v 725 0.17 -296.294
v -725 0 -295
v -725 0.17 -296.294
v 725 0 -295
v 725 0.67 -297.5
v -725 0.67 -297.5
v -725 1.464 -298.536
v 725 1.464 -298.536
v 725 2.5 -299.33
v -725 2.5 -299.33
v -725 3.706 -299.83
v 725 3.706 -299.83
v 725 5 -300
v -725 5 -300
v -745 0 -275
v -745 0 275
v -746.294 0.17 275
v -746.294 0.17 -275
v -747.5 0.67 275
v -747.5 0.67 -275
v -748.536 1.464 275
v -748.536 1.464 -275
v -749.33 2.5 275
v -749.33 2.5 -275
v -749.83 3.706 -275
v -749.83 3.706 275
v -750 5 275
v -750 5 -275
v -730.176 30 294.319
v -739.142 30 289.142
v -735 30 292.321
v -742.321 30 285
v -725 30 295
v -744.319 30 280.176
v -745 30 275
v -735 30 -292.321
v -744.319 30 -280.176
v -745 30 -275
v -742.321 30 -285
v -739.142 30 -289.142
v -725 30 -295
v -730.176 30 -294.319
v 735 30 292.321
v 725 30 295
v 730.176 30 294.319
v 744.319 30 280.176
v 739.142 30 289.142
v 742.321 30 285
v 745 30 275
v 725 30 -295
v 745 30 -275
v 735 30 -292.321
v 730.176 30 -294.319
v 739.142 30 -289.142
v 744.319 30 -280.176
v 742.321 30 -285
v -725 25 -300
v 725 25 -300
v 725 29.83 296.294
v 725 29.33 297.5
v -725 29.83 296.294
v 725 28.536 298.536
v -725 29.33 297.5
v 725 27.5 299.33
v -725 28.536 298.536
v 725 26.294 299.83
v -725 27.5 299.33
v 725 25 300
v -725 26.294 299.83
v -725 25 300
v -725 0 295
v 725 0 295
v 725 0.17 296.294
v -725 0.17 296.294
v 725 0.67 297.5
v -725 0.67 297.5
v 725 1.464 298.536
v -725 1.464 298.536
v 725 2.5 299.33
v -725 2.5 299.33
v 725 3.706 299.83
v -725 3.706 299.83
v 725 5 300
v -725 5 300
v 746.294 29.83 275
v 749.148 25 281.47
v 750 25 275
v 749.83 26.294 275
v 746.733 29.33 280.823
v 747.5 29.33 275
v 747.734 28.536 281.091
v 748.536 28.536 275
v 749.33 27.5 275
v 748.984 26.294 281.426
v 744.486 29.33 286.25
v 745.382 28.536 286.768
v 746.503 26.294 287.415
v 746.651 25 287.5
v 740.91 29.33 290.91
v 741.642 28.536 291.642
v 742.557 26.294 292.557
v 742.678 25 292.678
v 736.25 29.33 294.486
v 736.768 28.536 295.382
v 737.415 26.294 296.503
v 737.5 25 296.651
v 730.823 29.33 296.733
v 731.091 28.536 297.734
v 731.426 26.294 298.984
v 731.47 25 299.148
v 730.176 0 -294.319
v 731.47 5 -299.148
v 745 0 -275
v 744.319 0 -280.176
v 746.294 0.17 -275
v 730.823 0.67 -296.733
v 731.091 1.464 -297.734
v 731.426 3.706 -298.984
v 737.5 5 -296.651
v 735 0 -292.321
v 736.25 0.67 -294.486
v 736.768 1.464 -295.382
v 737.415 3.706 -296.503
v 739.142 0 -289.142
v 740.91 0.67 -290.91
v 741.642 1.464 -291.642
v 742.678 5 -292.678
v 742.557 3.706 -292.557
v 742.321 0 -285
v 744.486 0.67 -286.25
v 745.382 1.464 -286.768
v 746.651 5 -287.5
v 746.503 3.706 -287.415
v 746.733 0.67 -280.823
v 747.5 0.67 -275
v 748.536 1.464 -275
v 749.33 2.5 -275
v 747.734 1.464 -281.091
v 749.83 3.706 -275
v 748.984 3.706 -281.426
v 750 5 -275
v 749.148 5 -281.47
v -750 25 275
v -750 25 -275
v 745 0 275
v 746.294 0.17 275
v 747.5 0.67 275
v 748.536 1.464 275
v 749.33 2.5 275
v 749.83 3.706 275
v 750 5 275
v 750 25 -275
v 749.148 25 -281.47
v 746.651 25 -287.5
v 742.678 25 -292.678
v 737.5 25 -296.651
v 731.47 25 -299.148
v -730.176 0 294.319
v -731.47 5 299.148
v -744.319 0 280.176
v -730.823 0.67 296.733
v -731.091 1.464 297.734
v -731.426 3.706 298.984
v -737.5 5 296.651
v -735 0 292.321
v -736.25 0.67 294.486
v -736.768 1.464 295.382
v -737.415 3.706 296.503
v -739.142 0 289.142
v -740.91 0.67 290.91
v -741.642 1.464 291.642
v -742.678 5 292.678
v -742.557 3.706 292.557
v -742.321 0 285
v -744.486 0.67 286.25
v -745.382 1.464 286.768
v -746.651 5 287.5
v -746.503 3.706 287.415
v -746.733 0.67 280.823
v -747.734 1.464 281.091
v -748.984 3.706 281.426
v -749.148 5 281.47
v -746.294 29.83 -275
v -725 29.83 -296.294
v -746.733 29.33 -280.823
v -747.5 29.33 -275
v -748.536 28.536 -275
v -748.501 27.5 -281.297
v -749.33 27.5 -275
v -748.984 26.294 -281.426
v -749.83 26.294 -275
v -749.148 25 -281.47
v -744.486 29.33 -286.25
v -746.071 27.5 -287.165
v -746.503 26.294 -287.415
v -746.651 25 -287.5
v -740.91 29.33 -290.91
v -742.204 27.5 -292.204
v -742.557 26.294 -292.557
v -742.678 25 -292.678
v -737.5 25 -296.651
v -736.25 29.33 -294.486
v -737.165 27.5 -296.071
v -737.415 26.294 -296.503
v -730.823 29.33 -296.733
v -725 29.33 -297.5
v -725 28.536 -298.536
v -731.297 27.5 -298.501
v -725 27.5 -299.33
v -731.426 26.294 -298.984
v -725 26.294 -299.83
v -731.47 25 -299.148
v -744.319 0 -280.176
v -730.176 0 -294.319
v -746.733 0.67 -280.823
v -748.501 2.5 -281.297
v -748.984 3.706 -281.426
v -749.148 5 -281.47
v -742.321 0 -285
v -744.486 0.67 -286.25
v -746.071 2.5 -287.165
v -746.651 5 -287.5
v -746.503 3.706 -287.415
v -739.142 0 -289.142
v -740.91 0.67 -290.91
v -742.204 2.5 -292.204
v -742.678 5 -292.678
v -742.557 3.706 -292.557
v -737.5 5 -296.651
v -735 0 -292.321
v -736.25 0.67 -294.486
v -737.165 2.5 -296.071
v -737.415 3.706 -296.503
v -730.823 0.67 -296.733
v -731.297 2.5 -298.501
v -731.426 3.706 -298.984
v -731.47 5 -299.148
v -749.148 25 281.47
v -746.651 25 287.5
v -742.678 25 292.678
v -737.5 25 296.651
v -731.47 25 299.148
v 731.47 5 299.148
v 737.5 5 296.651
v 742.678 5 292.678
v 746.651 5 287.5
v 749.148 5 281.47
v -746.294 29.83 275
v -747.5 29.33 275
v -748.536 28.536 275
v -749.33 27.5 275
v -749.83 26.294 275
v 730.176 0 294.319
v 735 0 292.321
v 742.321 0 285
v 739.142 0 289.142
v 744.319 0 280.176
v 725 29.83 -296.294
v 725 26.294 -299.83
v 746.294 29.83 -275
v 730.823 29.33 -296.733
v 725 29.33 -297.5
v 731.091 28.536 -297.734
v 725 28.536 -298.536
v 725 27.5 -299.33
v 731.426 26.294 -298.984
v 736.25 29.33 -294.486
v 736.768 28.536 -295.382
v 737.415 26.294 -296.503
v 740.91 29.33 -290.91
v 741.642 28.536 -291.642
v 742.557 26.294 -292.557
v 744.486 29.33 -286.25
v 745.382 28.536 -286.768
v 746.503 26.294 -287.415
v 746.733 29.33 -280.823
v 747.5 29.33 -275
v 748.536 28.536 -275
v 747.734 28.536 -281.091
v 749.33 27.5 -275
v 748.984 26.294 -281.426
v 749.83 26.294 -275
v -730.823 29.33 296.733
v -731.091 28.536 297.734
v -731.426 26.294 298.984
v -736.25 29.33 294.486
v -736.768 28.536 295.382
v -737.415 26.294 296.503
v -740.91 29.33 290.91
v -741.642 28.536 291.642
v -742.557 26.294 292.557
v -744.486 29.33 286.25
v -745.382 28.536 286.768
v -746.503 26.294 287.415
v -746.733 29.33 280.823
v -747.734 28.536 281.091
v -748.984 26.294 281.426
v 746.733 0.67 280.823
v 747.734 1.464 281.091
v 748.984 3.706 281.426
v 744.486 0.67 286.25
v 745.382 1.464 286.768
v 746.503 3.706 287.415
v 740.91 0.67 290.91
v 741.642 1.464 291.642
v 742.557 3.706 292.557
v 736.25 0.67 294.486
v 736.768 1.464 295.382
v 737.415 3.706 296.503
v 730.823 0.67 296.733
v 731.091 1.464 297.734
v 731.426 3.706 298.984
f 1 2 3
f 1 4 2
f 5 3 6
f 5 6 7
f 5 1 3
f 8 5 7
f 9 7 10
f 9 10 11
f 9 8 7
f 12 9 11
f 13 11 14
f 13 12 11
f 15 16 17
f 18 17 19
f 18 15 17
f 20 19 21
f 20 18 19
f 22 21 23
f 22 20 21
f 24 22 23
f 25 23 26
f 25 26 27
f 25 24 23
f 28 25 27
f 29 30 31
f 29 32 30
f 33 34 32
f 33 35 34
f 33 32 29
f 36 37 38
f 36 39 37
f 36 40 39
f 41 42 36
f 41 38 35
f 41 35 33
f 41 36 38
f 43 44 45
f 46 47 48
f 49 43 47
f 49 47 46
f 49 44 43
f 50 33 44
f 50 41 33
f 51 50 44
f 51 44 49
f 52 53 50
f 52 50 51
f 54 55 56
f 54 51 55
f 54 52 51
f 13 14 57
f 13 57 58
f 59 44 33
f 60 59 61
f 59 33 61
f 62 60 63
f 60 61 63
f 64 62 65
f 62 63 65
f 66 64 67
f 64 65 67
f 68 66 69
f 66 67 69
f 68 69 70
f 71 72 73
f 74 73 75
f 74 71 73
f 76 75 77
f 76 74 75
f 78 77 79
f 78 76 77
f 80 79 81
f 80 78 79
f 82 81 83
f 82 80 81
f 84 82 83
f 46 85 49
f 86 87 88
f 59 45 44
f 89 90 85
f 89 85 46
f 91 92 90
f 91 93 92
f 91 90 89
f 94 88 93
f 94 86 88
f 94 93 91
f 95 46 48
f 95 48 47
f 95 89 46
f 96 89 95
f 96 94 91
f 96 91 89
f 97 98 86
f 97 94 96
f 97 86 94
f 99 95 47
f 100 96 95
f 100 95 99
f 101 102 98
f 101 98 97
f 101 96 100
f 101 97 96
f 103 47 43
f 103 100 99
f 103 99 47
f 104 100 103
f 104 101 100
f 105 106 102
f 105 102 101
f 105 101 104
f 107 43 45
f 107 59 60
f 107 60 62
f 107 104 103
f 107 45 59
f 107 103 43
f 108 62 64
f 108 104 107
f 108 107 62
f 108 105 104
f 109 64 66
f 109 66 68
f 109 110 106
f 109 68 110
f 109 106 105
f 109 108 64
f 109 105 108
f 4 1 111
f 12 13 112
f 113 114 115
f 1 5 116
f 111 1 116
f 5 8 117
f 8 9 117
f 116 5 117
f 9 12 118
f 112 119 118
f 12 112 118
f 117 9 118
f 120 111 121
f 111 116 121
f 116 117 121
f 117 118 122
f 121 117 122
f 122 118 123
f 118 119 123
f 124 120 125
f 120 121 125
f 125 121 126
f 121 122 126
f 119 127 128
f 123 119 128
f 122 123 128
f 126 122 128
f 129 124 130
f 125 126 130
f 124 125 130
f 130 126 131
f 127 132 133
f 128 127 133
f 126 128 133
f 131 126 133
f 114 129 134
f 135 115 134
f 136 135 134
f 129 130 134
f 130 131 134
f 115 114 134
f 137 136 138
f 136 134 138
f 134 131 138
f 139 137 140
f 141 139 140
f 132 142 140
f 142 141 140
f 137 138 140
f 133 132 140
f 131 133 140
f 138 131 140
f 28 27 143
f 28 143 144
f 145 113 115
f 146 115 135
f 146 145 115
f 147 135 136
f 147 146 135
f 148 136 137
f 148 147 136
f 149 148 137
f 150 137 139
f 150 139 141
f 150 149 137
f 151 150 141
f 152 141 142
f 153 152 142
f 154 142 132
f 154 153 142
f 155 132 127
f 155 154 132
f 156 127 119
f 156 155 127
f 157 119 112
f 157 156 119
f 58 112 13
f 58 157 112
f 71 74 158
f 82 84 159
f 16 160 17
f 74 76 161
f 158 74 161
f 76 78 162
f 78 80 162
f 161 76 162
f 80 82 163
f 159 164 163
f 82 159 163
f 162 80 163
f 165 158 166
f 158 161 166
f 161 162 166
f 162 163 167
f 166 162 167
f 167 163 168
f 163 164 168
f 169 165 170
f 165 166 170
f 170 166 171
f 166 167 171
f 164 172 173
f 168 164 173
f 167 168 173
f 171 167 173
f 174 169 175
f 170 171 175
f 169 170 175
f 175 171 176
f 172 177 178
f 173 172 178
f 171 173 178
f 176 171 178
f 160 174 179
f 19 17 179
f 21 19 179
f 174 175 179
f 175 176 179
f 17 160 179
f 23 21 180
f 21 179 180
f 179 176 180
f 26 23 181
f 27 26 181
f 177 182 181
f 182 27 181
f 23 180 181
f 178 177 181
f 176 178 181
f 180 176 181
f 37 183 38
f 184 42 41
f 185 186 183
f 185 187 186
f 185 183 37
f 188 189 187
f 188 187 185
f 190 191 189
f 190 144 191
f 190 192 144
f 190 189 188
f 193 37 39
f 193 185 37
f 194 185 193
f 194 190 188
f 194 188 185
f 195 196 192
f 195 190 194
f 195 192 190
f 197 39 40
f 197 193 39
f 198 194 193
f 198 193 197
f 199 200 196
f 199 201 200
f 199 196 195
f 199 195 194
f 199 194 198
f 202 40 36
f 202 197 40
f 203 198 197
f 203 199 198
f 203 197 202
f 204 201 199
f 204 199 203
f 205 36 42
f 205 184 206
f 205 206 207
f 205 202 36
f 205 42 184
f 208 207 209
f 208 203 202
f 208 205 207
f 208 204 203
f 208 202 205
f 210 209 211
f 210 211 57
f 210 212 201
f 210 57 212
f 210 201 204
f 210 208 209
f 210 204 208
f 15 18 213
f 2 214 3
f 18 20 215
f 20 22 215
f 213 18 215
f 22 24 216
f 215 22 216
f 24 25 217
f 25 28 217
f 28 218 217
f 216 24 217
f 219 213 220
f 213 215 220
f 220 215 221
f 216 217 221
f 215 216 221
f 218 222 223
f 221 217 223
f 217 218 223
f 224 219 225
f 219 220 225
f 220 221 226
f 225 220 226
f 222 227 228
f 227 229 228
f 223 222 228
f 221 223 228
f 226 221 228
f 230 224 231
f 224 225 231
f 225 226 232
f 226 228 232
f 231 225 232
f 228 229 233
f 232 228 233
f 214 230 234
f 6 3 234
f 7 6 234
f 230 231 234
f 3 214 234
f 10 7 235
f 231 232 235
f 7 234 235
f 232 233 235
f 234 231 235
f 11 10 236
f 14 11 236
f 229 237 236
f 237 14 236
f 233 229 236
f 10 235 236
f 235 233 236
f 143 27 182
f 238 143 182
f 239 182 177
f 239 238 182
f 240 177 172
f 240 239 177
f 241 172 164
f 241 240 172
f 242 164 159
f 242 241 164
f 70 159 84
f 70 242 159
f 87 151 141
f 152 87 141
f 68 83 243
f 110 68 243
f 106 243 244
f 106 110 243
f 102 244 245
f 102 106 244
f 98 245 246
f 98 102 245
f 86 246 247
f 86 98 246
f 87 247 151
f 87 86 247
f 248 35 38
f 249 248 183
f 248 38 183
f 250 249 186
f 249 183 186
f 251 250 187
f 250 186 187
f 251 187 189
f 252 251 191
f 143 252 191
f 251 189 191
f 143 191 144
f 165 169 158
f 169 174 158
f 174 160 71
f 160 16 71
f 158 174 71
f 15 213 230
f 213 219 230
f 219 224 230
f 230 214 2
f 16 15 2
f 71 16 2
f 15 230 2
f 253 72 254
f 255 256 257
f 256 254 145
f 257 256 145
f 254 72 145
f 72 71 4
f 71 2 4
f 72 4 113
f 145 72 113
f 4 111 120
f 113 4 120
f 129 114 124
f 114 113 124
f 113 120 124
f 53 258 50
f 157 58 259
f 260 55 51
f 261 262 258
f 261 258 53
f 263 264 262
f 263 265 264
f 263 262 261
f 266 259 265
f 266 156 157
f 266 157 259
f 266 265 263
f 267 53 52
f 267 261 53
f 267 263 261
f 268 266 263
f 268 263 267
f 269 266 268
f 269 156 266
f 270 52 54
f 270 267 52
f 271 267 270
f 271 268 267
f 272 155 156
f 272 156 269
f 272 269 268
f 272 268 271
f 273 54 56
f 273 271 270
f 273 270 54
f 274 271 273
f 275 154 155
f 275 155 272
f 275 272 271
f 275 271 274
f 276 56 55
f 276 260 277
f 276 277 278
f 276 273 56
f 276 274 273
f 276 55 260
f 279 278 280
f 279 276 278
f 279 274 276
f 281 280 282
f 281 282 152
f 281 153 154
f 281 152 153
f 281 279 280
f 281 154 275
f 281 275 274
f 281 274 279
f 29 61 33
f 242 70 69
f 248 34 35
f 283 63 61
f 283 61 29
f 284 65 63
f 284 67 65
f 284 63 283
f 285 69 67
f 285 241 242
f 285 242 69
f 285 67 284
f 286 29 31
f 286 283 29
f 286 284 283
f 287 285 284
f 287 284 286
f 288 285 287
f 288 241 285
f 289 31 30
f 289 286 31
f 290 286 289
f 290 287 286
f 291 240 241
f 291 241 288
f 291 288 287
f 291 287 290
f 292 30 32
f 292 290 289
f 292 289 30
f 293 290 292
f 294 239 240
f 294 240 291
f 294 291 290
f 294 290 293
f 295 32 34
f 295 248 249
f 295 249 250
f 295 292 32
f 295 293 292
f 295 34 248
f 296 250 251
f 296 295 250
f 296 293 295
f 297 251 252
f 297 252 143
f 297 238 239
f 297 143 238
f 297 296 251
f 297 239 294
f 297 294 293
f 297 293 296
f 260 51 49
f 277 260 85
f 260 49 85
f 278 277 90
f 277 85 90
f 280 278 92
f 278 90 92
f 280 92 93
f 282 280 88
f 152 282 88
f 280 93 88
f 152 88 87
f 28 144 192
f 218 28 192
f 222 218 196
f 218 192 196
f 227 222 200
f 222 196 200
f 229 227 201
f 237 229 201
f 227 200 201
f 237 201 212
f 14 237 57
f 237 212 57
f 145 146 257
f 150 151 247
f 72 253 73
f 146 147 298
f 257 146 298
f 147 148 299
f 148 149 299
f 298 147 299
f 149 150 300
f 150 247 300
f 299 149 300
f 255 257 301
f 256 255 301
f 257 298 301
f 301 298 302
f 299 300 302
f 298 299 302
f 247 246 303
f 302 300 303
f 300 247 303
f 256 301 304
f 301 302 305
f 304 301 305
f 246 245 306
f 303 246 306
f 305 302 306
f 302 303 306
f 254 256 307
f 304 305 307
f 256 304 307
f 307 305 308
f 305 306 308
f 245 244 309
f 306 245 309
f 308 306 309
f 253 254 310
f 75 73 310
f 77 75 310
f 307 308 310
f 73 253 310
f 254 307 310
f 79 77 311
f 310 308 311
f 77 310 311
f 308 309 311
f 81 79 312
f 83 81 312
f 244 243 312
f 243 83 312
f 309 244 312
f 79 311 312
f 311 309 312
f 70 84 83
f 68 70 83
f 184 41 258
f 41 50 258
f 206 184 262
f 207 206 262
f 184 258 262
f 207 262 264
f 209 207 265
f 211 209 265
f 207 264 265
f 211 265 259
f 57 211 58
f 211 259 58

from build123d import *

# Parameters (mm, degrees)
SKETCH_1_W      = 1500
SKETCH_1_H      = 600
EXTRUDE_1_DEPTH = 30
FILLET_1_R      = 25
FILLET_2_R      = 5


with BuildPart() as part:
    # 草图1 → 凸台-拉伸1 (new body)
    with BuildSketch(Plane(origin=(0, 0, 0), x_dir=(1, 0, 0), z_dir=(0, 1, 0))):
        Rectangle(SKETCH_1_W, SKETCH_1_H)
    extrude(amount=EXTRUDE_1_DEPTH)

    # 圆角1
    fillet_1_edges = [part.edges().sort_by_distance(p)[0] for p in [
        (750, 15, 300),
        (-750, 15, 300),
        (-750, 15, -300),
        (750, 15, -300),
    ]]
    fillet(fillet_1_edges, radius=FILLET_1_R)

    # 圆角2
    fillet_2_edges = [part.edges().sort_by_distance(p)[0] for p in [
        (0, 0, -300),
        (0, 30, -300),
        (750, 0, 0),
        (0, 0, 300),
        (-750, 0, 0),
        (-742.67766953, 0, 292.67766953),
        (-742.67766953, 0, -292.67766953),
        (742.67766953, 0, 292.67766953),
        (742.67766953, 0, -292.67766953),
        (750, 30, 0),
        (-750, 30, 0),
        (0, 30, 300),
        (-742.67766953, 30, 292.67766953),
        (-742.67766953, 30, -292.67766953),
        (742.67766953, 30, 292.67766953),
        (742.67766953, 30, -292.67766953),
    ]]
    fillet(fillet_2_edges, radius=FILLET_2_R)


solid = part.part
